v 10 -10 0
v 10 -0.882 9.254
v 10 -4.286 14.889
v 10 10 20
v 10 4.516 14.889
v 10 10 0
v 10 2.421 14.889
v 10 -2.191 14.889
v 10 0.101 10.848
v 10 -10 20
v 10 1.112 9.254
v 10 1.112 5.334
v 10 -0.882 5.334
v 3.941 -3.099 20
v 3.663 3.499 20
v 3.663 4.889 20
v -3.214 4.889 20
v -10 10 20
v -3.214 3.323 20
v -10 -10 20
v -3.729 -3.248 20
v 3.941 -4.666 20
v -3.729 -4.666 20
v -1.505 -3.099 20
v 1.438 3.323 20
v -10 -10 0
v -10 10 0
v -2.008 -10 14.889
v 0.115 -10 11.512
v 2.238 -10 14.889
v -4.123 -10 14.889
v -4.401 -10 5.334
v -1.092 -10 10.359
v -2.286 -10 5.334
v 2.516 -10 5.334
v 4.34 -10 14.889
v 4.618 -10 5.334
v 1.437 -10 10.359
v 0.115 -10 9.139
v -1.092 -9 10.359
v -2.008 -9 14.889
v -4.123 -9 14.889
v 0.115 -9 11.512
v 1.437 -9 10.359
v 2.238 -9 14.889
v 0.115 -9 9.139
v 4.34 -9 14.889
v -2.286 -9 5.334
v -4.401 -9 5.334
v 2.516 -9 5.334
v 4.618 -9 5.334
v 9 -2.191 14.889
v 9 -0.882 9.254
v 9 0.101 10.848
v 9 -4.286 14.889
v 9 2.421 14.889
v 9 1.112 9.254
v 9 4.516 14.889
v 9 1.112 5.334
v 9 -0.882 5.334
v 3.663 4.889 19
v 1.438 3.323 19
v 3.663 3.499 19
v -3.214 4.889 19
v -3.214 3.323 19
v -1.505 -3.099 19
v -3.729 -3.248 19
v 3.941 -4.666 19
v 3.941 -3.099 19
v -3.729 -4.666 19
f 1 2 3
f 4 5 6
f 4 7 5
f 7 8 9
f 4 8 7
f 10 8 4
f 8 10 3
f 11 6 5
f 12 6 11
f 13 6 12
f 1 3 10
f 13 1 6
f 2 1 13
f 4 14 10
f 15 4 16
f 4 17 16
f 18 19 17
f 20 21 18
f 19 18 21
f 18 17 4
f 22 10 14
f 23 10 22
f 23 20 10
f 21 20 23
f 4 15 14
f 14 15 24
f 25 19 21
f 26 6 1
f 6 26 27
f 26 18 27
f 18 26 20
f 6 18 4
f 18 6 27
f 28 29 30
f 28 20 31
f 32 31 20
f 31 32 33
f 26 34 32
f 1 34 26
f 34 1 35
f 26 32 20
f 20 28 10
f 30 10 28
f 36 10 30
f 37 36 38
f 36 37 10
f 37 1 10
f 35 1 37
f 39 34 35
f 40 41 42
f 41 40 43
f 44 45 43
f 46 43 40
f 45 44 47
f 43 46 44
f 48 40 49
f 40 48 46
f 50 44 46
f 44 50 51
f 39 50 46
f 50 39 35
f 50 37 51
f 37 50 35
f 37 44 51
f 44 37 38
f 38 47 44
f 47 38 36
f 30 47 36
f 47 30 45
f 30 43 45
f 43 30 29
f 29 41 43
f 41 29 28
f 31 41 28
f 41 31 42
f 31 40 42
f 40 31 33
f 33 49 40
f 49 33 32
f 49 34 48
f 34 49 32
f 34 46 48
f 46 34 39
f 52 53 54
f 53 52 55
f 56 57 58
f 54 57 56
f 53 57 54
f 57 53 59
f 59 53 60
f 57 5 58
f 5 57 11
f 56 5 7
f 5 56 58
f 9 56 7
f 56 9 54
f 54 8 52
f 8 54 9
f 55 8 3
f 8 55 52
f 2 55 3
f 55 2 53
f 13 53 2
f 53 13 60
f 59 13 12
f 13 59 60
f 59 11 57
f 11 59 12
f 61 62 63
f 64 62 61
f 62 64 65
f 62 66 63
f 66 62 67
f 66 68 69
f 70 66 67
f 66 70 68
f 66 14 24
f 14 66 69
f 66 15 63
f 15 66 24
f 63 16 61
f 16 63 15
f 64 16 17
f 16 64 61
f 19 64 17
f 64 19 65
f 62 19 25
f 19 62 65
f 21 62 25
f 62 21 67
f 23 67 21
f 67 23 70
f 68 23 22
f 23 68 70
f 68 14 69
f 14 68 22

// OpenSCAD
// XYZ 20mm Calibration Cube
// Based on the design proposed by iDig3Dprinting https://www.thingiverse.com/thing:1278865
// Freely adapted by 5@xes

font = "Arial:style=Bold";

$fn=100;

cube_size = 20;
letter_size = 0.5*cube_size;
letter_height = 0.2*letter_size;

o = cube_size / 2 - letter_height / 2;

module letter(Txt) {
  color("Yellow")
  linear_extrude(height = letter_height) {
    text(Txt, size = letter_size, font = font, halign = "center", valign = "center");
  }
}

translate([0, 0, 10]) difference() {
  color("gray") 
  cube(cube_size, center = true);
  translate([0, -o, 0]) rotate([90, 0, 0]) letter("X");
  translate([o, 0, 0]) rotate([90, 0, 90]) letter("Y");
  translate([0, 0, o])  letter("Z");
}
